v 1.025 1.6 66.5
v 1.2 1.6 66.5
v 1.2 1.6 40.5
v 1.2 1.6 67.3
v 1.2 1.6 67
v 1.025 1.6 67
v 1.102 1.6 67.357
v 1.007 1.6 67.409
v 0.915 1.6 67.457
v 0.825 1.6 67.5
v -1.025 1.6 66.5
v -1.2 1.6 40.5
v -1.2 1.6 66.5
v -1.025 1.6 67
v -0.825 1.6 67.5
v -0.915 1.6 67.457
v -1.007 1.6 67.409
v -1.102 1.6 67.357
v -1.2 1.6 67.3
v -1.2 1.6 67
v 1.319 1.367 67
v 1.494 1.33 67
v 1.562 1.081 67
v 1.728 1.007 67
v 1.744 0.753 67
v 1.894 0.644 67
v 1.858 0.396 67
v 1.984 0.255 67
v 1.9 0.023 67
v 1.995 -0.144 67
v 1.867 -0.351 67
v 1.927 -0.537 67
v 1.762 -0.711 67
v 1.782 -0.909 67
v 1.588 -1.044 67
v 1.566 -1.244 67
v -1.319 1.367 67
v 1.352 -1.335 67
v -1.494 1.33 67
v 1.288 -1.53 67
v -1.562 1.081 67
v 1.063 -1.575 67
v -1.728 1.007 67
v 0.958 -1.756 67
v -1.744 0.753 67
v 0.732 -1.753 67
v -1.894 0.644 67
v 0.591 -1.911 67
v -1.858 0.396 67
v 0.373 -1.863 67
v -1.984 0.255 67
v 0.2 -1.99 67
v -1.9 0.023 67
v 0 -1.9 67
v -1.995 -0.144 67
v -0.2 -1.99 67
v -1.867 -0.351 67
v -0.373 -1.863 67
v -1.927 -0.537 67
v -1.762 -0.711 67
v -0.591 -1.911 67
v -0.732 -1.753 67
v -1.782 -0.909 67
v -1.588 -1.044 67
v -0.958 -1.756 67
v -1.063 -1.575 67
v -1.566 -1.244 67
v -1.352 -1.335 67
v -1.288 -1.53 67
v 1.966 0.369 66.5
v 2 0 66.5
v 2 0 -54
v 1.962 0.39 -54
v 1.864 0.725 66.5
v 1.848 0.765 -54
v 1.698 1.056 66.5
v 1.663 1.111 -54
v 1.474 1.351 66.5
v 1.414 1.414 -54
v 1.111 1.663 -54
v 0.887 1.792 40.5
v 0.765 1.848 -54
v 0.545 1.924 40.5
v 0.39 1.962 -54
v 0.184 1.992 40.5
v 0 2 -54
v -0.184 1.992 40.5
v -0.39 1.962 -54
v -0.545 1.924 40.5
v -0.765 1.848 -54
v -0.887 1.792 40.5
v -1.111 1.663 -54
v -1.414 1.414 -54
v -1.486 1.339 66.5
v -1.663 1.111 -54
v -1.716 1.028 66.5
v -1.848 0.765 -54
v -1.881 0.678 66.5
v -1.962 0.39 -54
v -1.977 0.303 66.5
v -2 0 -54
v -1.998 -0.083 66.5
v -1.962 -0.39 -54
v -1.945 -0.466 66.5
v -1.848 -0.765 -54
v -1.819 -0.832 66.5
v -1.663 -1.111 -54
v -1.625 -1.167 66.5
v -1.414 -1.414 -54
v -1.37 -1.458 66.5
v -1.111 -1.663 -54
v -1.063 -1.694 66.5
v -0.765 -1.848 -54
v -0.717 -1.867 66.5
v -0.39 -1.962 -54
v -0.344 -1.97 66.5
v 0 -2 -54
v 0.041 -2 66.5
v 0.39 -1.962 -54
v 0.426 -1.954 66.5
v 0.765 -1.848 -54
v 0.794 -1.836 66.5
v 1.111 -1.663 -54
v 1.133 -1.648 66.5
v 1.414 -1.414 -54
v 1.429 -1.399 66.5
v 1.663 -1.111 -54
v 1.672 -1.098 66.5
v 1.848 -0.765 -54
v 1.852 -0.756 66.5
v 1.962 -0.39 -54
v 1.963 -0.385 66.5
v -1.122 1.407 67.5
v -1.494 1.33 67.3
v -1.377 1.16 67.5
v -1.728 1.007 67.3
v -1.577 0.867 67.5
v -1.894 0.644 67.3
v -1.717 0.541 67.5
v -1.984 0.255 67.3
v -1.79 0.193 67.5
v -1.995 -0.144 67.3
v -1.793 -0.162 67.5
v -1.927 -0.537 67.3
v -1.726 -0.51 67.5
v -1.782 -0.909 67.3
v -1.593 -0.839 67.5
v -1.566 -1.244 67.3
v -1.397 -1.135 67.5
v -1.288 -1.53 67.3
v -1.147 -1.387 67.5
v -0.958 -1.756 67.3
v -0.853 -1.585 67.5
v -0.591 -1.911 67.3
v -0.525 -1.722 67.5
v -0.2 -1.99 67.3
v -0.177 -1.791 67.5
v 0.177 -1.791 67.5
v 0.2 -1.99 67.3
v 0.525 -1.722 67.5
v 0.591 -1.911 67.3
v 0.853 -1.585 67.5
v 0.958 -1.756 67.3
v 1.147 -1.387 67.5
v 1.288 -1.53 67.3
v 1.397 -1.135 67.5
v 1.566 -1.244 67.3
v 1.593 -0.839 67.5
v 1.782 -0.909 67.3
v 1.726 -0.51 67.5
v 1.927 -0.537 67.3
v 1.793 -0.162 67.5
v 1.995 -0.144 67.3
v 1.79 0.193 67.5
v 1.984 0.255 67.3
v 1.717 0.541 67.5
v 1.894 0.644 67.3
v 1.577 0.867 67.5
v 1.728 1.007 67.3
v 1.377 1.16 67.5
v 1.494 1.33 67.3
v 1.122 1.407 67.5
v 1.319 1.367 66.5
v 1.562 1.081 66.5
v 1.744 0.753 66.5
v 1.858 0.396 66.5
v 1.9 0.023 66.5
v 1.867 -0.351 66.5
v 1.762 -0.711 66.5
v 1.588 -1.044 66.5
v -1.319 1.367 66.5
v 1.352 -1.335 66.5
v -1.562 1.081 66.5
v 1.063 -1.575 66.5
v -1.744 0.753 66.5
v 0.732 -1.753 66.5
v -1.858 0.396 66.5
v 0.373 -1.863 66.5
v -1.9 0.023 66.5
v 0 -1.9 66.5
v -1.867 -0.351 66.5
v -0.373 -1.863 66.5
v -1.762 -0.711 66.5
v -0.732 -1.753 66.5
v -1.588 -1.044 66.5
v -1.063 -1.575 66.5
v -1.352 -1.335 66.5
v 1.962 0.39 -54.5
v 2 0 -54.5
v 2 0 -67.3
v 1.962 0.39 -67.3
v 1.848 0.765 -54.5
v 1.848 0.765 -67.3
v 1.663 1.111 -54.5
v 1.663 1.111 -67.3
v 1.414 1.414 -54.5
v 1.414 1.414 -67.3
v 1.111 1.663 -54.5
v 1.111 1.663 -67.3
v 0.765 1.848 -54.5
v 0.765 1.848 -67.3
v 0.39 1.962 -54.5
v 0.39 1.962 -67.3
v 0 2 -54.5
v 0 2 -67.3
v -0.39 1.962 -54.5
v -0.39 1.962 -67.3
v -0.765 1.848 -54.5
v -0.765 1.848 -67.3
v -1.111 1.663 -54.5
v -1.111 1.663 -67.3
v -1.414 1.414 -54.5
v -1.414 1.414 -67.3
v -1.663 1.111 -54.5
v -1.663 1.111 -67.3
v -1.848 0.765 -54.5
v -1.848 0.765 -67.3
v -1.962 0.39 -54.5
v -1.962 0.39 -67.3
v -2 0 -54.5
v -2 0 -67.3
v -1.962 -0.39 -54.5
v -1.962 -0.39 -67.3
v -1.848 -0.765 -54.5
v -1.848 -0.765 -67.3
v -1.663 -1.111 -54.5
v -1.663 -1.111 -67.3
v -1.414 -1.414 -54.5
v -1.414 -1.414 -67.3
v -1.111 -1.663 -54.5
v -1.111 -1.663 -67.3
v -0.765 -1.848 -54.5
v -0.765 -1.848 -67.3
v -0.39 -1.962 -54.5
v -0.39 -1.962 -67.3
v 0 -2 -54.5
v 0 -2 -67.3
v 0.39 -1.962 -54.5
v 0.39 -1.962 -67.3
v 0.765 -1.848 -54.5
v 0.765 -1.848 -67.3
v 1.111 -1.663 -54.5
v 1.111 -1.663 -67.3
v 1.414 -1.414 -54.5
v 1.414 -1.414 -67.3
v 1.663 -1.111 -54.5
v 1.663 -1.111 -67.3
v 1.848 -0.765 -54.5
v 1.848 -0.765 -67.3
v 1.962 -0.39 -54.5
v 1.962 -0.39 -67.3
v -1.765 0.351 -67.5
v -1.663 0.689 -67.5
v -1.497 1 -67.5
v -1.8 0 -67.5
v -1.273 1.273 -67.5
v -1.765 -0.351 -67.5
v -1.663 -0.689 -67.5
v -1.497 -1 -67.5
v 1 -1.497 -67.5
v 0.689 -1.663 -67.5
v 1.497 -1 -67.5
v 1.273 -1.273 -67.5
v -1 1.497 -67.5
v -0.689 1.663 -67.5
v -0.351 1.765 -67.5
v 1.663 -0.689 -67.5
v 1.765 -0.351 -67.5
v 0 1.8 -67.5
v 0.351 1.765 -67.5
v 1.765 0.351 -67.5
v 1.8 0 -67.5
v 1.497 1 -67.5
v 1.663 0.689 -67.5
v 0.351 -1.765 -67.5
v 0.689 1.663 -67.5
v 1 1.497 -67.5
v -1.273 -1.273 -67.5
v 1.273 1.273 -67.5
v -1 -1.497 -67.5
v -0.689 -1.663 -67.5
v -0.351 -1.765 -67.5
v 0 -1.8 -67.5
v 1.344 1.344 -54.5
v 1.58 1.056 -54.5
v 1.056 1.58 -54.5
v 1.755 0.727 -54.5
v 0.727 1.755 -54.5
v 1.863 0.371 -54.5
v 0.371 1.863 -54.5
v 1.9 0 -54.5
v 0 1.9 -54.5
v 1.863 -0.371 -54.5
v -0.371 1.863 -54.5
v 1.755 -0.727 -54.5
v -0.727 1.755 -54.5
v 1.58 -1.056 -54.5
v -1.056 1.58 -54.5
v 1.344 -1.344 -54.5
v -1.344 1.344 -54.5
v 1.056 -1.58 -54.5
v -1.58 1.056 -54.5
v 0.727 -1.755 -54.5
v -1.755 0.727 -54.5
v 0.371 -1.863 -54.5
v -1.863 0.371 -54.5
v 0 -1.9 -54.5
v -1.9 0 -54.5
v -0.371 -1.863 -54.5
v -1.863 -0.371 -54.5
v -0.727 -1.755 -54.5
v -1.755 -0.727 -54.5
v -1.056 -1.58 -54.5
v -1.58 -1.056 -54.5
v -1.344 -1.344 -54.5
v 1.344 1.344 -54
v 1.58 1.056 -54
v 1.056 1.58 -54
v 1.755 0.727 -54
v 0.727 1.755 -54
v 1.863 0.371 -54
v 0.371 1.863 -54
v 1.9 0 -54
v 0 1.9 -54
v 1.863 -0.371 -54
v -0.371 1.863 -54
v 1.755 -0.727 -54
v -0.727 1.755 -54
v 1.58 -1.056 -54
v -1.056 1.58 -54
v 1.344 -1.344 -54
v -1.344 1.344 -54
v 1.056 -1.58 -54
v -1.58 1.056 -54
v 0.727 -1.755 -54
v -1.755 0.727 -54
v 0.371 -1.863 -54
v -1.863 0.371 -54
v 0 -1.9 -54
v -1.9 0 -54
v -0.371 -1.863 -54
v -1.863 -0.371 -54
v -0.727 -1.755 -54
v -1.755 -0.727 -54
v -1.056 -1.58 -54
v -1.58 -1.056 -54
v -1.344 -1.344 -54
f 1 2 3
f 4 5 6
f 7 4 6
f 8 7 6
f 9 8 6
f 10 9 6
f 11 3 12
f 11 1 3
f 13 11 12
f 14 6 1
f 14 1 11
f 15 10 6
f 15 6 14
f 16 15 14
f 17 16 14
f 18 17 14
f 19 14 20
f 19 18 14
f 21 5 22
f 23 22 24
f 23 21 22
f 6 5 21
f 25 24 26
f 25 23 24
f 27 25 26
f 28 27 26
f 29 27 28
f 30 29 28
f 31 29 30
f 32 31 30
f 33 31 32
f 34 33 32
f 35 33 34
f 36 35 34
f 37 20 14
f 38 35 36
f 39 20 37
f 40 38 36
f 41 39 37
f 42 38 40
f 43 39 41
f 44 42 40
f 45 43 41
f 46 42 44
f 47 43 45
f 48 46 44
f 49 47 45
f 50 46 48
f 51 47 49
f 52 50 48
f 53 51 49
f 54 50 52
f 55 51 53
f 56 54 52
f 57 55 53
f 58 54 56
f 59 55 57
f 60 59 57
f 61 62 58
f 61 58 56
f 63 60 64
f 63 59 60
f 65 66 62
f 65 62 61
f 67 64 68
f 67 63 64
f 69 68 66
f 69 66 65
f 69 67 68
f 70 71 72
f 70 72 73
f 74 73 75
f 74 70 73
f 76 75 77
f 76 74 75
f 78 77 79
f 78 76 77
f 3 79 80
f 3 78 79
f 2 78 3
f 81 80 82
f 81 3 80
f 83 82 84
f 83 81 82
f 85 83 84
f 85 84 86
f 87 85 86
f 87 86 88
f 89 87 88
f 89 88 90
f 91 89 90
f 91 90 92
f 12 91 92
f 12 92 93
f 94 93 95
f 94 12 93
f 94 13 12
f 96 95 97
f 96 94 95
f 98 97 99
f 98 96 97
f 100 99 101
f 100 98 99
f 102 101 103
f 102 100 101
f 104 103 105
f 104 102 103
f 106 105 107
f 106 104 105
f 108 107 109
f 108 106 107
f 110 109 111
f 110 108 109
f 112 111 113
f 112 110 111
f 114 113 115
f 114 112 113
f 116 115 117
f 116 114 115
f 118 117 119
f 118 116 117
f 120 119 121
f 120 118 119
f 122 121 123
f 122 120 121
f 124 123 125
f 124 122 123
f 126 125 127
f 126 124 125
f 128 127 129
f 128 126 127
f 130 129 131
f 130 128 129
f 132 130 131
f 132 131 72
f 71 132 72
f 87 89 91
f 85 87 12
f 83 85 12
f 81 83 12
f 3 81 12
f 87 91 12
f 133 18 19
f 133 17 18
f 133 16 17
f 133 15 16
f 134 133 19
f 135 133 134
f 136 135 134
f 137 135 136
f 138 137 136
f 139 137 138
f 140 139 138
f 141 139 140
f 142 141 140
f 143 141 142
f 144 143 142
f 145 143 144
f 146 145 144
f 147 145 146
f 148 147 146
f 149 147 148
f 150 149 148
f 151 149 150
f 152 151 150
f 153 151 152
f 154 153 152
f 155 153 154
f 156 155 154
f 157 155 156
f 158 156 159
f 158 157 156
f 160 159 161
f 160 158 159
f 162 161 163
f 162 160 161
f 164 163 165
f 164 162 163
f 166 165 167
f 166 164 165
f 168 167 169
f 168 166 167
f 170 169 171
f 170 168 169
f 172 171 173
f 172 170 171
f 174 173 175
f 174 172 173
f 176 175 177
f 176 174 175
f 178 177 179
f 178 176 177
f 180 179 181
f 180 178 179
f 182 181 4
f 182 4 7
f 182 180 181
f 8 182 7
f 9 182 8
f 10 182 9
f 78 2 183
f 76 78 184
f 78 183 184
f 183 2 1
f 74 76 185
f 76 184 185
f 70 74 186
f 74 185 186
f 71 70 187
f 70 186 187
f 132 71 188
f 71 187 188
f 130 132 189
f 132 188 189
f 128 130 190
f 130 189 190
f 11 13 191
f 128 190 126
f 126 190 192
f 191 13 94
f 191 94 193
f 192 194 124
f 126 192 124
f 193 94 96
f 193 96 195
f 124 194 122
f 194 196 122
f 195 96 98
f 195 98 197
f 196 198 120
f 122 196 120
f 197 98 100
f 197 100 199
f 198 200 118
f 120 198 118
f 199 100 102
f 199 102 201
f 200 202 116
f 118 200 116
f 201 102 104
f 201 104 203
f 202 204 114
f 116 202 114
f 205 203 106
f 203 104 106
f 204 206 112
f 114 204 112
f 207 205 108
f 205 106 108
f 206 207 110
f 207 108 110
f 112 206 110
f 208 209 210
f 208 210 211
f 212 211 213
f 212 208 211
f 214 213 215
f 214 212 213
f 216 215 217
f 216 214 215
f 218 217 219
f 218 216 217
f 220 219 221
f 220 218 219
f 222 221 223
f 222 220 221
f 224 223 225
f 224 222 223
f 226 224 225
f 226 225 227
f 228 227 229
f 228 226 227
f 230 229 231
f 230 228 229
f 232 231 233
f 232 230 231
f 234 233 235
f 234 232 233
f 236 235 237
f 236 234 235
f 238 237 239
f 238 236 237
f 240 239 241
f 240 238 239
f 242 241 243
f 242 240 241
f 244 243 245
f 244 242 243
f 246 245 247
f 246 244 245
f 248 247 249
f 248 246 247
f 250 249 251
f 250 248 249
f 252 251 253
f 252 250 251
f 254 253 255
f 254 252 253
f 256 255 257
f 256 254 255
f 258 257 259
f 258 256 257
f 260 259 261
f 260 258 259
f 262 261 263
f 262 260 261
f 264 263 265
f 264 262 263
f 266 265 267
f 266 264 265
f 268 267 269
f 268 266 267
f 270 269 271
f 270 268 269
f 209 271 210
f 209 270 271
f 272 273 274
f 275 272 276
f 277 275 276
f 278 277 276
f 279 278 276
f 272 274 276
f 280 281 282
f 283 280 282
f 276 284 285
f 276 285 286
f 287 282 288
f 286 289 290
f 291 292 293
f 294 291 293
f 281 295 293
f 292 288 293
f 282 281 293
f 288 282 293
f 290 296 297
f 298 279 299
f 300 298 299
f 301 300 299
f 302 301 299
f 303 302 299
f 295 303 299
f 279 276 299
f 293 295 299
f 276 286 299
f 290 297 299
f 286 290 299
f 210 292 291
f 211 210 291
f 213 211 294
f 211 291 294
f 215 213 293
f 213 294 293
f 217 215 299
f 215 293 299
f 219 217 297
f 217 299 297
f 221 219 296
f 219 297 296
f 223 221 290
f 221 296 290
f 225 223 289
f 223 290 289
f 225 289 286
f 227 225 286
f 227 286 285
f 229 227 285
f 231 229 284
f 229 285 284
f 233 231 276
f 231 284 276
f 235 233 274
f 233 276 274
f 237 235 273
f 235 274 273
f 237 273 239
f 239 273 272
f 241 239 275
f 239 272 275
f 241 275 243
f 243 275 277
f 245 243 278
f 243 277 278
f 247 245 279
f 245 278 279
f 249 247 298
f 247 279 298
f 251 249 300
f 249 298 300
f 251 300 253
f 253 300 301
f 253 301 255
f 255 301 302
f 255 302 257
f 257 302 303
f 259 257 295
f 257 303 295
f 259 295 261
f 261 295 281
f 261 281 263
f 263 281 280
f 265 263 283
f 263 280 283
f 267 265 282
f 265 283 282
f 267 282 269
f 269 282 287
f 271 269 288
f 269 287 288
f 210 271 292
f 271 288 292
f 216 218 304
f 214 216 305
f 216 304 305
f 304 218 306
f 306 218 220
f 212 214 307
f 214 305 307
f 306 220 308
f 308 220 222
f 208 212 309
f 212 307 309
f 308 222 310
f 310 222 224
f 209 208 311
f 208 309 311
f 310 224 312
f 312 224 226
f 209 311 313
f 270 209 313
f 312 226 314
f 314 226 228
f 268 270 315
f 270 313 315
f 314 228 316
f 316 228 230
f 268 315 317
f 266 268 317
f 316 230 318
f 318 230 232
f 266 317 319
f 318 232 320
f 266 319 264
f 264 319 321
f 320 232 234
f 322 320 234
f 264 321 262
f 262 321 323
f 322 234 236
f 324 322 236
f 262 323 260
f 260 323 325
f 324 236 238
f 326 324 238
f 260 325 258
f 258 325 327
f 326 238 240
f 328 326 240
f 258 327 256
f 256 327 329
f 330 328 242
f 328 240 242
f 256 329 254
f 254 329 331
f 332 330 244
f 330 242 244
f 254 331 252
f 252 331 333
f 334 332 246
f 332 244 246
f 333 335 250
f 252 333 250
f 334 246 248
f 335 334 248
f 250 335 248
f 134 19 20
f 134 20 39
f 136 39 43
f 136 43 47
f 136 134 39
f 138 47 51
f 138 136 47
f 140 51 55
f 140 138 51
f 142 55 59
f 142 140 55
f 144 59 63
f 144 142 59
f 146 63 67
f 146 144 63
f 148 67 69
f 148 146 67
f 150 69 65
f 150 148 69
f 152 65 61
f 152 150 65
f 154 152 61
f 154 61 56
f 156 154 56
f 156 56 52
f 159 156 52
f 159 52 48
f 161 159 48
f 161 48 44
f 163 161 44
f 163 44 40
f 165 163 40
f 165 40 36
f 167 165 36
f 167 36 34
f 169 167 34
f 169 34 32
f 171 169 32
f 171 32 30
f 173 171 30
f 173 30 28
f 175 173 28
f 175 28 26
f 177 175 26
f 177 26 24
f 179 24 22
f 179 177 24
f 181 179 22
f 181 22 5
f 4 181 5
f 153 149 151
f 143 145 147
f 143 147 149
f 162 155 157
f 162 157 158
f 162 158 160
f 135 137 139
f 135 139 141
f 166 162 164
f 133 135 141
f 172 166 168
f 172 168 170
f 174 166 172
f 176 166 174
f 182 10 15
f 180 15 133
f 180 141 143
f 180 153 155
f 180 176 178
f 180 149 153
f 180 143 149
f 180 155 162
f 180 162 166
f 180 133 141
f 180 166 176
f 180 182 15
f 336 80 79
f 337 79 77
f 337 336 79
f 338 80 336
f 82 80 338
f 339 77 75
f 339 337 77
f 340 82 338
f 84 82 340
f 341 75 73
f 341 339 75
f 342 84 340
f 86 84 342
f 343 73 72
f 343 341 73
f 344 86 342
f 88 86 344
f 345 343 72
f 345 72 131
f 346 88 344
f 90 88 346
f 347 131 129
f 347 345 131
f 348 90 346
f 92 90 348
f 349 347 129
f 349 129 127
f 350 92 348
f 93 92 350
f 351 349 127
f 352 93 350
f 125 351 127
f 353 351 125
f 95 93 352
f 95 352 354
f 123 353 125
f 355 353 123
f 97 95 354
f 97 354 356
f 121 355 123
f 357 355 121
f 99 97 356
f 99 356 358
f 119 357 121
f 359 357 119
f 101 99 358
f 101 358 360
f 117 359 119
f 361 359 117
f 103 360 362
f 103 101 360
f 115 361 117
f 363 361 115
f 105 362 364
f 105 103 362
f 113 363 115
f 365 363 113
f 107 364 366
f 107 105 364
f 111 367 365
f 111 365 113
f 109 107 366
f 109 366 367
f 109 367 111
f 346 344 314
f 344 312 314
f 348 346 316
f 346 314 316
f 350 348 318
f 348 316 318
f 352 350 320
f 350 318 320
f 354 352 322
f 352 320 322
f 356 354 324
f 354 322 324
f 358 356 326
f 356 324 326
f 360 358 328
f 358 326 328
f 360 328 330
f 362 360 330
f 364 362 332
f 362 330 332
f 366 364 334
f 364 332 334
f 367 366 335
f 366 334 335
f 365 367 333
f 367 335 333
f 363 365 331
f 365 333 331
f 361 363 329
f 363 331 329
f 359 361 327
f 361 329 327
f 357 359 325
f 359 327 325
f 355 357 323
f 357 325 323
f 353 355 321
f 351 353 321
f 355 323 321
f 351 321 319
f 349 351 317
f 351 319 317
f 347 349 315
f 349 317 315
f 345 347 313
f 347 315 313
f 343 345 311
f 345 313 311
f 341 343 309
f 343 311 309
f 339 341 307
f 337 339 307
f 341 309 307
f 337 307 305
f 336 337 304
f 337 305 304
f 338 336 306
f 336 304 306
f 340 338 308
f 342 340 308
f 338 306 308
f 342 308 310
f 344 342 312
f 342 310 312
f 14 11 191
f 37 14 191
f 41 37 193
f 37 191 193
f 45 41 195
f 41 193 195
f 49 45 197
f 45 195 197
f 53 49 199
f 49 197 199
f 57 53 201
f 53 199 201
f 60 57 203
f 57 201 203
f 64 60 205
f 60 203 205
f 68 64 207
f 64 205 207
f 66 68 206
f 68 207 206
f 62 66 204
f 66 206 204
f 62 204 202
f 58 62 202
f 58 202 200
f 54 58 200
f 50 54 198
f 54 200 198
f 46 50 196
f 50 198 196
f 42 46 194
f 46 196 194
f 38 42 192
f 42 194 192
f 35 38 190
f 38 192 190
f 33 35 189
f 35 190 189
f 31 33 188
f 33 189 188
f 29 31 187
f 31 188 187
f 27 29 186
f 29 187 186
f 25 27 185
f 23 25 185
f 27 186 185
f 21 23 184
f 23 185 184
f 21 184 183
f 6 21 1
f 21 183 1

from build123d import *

# Parameters (mm, degrees)
SKIZZE1_R                       = 2
AUFSATZ_LINEAR_AUSTRAGEN1_DEPTH = 67.5
SKIZZE7_W                       = 0.5
SKIZZE7_H                       = 0.1
SCHNITT_LINEAR_AUSTRAGEN1_DEPTH = 27
FASE1_SIZE                      = 0.2


with BuildPart() as part:
    # Skizze1 → Aufsatz-Linear austragen1 (new, symmetric)
    with BuildSketch(Plane.XY):
        Circle(SKIZZE1_R)
    extrude(amount=AUFSATZ_LINEAR_AUSTRAGEN1_DEPTH, both=True)

    # Skizze7 → Schnitt-Rotation1 (revolve, cut)
    with BuildSketch(Plane(origin=(0, 0, 0), x_dir=(0, 0, -1), z_dir=(1, 0, 0))):
        with Locations((-66.75, 1.95)):
            Rectangle(SKIZZE7_W, SKIZZE7_H)
        with Locations((54.25, 1.95)):
            Rectangle(SKIZZE7_W, SKIZZE7_H)
    revolve(axis=Axis((0, 0, -67.5), (0, 0, 1)), mode=Mode.SUBTRACT)

    # Skizze8 → Schnitt-Linear austragen1 (cut)
    with BuildSketch(Plane.XY.offset(67.5)):
        with BuildLine():
            Line((1.2, 1.6), (-1.2, 1.6))
            ThreePointArc((-1.2, 1.6), (0, 2), (1.2, 1.6))
        make_face()
    extrude(amount=-SCHNITT_LINEAR_AUSTRAGEN1_DEPTH, mode=Mode.SUBTRACT)

    # Fase1
    fase1_edges = [part.edges().sort_by_distance(p)[0] for p in [
        (-2, 0, -67.5),
        (0, -2, 67.5),
    ]]
    chamfer(fase1_edges, length=FASE1_SIZE)


solid = part.part
